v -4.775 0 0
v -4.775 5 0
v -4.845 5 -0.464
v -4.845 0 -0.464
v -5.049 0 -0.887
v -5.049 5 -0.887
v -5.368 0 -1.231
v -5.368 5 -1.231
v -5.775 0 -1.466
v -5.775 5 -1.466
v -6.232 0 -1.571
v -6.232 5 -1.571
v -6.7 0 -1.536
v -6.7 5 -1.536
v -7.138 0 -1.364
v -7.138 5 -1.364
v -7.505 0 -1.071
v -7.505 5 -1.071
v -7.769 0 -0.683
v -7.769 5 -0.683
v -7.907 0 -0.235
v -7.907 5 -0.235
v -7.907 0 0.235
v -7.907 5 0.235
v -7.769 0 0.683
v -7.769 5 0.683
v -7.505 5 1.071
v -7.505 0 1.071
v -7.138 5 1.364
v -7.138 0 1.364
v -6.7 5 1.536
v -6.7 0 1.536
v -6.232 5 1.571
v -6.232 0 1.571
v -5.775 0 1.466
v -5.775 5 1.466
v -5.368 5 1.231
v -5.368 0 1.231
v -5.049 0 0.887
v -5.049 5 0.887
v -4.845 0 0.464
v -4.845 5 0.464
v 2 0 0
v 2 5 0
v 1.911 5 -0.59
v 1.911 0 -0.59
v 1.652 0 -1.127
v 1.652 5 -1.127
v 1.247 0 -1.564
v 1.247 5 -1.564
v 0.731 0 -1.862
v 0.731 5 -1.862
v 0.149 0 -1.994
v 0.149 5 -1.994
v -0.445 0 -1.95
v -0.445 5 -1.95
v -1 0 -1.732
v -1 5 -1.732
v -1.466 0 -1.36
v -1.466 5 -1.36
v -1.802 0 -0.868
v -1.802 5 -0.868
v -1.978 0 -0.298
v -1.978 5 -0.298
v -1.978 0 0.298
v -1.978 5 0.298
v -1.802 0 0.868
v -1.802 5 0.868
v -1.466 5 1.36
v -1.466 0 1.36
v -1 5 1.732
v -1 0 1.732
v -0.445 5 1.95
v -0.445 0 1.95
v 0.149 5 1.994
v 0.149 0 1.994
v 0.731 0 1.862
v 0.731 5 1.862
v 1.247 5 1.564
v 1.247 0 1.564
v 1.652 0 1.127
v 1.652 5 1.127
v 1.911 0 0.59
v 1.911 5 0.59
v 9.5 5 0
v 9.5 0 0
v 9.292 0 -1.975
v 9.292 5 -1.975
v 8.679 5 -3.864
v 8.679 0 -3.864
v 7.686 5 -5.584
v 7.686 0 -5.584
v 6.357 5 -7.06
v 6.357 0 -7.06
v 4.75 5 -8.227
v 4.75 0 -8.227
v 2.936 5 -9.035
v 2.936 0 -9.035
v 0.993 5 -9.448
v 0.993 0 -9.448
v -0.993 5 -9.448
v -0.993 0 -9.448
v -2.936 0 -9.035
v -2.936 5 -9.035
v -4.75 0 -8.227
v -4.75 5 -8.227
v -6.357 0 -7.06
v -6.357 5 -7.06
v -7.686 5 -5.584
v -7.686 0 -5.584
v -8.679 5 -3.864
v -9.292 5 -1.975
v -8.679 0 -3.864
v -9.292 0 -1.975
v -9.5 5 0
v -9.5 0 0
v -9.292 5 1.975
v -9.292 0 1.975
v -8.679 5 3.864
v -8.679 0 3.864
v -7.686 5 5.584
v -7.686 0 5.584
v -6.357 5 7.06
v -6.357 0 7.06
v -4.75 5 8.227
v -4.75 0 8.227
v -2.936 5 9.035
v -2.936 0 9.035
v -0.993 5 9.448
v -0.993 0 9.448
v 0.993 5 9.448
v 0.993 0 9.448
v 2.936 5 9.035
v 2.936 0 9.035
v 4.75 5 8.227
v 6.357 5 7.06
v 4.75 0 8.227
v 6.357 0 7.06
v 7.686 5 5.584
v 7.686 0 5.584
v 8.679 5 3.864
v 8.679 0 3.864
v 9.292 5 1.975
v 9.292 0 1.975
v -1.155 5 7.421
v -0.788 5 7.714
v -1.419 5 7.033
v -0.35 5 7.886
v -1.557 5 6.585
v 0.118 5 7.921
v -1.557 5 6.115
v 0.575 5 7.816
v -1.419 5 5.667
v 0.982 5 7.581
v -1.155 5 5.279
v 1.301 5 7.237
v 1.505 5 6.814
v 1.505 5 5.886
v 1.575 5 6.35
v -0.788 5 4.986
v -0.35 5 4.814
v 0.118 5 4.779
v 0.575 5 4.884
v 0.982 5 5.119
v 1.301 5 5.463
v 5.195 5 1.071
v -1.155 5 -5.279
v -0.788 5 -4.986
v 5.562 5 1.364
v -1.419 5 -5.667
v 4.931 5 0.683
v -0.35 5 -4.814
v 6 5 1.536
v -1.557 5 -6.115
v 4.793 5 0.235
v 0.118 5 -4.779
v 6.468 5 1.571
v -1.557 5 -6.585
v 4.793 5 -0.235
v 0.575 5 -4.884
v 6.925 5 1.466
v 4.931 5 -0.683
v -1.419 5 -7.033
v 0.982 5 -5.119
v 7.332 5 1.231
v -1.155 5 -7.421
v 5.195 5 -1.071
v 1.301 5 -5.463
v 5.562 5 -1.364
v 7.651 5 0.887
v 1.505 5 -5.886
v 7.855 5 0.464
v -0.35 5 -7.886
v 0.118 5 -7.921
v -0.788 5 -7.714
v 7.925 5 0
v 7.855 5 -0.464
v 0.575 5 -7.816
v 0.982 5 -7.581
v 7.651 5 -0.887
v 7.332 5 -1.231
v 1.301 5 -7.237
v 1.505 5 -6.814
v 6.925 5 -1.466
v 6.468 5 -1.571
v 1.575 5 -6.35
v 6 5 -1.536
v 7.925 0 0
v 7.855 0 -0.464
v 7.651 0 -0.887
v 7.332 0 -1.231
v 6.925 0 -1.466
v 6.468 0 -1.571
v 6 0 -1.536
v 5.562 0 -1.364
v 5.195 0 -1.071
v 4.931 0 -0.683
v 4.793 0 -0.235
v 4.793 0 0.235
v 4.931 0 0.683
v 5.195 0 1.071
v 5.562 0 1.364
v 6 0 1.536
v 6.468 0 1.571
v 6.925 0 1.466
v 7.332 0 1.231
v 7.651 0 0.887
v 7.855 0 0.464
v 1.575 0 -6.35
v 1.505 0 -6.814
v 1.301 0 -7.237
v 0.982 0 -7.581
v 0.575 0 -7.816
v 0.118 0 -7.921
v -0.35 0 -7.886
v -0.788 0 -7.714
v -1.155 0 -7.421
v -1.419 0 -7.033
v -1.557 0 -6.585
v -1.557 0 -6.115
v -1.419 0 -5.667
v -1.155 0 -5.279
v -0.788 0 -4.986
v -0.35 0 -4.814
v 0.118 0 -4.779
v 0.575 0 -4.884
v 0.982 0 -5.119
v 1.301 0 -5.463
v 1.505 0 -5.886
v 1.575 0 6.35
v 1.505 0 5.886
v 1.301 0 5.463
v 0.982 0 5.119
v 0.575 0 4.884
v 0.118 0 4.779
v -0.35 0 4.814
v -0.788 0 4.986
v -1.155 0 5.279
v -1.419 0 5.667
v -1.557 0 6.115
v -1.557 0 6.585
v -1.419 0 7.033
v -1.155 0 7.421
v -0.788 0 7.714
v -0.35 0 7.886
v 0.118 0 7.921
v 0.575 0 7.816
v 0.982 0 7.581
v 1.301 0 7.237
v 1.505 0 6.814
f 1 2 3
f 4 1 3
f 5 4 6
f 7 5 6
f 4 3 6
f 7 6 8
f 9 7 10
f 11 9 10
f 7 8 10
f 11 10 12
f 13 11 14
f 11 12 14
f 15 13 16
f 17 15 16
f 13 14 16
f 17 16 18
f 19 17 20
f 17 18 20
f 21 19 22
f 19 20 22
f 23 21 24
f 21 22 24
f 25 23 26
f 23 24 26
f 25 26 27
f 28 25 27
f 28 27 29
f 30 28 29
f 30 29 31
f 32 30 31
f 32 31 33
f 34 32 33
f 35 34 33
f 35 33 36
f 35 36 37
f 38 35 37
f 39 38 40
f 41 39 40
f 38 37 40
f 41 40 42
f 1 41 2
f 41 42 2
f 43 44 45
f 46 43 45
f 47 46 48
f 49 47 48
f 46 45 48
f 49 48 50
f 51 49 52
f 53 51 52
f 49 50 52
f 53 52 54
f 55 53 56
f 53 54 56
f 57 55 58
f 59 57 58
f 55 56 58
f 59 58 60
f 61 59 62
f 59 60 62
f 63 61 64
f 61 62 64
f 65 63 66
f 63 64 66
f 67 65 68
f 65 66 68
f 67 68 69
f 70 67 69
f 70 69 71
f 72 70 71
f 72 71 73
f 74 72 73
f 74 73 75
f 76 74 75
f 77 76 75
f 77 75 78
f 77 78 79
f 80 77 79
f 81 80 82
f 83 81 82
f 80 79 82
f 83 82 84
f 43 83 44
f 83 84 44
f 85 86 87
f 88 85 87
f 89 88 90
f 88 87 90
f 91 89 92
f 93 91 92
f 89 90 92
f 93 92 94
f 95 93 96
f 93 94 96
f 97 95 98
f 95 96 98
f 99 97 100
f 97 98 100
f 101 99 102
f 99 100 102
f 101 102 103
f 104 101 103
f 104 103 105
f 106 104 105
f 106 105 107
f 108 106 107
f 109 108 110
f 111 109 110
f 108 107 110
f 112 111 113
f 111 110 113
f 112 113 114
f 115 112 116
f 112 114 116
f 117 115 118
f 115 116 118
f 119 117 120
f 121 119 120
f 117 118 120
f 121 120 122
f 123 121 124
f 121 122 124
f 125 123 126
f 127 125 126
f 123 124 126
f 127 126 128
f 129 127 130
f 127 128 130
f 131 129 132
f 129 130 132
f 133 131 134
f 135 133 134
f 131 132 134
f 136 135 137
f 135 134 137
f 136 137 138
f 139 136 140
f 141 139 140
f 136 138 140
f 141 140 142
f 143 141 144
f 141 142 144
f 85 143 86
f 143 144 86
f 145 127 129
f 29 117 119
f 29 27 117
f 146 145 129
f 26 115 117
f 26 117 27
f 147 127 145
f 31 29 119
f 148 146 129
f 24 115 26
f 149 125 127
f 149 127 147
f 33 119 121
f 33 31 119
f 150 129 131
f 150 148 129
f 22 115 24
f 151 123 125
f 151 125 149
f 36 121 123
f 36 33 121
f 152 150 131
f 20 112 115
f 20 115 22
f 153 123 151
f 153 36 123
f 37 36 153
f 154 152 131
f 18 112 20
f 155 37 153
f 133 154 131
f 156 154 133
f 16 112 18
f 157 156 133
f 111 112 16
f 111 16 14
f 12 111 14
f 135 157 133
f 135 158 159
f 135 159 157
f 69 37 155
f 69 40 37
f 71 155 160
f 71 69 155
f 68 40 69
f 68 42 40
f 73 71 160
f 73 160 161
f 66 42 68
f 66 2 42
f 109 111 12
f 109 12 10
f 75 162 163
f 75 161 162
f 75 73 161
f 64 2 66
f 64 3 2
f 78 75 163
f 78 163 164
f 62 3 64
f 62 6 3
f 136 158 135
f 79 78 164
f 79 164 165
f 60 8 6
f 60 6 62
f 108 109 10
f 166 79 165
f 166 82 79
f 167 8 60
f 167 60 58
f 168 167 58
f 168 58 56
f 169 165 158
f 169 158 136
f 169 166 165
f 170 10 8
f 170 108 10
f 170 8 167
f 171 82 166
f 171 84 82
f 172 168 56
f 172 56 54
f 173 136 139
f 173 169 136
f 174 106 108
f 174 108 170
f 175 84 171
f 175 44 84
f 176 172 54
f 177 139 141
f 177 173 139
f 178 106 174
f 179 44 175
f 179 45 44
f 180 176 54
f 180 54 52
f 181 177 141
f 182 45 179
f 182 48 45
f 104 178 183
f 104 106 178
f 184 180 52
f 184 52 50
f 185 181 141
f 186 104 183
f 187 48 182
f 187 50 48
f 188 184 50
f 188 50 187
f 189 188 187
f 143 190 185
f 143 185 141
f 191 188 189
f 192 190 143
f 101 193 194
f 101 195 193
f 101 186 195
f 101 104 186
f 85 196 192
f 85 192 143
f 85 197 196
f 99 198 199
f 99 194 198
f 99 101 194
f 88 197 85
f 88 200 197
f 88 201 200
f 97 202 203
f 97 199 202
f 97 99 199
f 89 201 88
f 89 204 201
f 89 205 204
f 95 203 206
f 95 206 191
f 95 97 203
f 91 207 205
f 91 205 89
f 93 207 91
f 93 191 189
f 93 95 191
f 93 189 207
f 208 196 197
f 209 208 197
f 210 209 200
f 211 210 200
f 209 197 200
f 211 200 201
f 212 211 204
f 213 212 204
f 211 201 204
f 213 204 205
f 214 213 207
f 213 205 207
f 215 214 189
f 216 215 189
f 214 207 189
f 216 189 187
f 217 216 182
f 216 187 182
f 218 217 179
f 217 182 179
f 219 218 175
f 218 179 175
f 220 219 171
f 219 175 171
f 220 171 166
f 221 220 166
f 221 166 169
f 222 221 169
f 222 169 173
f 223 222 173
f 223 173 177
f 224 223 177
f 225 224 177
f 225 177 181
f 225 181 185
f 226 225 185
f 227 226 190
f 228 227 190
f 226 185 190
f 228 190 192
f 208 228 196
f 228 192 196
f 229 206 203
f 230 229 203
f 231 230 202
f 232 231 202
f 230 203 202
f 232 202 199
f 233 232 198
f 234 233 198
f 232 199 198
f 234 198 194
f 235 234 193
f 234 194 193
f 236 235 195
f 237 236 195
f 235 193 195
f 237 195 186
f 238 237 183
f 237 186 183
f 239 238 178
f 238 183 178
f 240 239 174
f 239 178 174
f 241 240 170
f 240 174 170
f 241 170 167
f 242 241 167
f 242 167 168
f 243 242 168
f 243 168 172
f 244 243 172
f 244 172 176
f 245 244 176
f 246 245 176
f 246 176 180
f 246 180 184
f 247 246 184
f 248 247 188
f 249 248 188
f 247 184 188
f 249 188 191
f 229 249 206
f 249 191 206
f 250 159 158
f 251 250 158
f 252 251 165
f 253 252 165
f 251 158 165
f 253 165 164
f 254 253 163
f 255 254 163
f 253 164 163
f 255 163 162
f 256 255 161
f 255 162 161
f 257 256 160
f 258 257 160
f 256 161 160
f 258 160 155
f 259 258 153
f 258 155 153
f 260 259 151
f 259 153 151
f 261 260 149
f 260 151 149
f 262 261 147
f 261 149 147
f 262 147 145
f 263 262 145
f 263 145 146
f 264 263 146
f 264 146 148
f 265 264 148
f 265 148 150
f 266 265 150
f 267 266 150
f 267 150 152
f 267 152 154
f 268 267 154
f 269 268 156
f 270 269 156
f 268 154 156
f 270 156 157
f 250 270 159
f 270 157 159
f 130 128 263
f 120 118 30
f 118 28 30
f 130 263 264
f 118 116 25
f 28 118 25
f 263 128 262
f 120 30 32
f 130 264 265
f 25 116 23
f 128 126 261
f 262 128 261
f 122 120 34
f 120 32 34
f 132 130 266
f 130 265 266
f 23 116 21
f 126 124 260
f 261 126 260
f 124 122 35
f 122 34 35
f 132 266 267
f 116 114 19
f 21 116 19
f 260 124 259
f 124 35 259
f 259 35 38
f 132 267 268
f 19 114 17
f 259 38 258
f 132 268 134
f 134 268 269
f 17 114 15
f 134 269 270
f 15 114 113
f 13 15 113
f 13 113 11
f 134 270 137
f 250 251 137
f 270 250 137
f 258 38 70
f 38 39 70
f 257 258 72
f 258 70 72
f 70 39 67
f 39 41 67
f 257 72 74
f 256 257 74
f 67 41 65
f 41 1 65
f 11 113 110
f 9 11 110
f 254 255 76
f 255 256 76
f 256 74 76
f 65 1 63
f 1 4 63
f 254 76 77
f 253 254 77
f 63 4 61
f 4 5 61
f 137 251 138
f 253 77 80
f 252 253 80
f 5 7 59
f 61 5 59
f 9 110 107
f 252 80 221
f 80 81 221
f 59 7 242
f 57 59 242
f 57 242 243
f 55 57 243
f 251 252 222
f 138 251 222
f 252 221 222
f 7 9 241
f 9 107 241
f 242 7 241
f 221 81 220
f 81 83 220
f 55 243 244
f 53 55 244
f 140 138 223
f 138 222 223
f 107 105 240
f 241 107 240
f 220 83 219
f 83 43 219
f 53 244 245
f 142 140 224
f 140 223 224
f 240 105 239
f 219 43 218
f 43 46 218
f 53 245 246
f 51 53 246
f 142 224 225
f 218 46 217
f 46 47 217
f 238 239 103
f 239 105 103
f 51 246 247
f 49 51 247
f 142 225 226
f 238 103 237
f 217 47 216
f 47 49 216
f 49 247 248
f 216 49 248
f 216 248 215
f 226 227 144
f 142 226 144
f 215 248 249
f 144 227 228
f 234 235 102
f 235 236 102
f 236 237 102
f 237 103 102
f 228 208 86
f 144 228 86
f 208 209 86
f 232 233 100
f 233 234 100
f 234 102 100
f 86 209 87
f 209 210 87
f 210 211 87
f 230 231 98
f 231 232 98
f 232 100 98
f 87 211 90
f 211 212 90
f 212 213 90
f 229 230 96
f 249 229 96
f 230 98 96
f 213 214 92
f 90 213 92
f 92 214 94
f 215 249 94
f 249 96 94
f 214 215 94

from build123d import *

# Parameters (mm, degrees)
SKETCH1_R           = 9.5
BOSS_EXTRUDE1_DEPTH = 5
SKETCH2_R           = 1.575
SKETCH2_R_2         = 2
CUT_EXTRUDE1_DEPTH  = 5


with BuildPart() as part:
    # Sketch1 → Boss-Extrude1 (new body)
    with BuildSketch(Plane(origin=(0, 0, 0), x_dir=(1, 0, 0), z_dir=(0, 1, 0))):
        Circle(SKETCH1_R)
    extrude(amount=BOSS_EXTRUDE1_DEPTH)

    # Sketch2 → Cut-Extrude1 (cut)
    with BuildSketch(Plane(origin=(0, 5, 0), x_dir=(1, 0, 0), z_dir=(0, 1, 0))):
        with Locations((0, 6.35)):
            Circle(SKETCH2_R)
        with Locations((6.35, 0)):
            Circle(SKETCH2_R)
        with Locations((0, -6.35)):
            Circle(SKETCH2_R)
        with Locations((-6.35, 0)):
            Circle(SKETCH2_R)
        Circle(SKETCH2_R_2)
    extrude(amount=-CUT_EXTRUDE1_DEPTH, mode=Mode.SUBTRACT)


solid = part.part
